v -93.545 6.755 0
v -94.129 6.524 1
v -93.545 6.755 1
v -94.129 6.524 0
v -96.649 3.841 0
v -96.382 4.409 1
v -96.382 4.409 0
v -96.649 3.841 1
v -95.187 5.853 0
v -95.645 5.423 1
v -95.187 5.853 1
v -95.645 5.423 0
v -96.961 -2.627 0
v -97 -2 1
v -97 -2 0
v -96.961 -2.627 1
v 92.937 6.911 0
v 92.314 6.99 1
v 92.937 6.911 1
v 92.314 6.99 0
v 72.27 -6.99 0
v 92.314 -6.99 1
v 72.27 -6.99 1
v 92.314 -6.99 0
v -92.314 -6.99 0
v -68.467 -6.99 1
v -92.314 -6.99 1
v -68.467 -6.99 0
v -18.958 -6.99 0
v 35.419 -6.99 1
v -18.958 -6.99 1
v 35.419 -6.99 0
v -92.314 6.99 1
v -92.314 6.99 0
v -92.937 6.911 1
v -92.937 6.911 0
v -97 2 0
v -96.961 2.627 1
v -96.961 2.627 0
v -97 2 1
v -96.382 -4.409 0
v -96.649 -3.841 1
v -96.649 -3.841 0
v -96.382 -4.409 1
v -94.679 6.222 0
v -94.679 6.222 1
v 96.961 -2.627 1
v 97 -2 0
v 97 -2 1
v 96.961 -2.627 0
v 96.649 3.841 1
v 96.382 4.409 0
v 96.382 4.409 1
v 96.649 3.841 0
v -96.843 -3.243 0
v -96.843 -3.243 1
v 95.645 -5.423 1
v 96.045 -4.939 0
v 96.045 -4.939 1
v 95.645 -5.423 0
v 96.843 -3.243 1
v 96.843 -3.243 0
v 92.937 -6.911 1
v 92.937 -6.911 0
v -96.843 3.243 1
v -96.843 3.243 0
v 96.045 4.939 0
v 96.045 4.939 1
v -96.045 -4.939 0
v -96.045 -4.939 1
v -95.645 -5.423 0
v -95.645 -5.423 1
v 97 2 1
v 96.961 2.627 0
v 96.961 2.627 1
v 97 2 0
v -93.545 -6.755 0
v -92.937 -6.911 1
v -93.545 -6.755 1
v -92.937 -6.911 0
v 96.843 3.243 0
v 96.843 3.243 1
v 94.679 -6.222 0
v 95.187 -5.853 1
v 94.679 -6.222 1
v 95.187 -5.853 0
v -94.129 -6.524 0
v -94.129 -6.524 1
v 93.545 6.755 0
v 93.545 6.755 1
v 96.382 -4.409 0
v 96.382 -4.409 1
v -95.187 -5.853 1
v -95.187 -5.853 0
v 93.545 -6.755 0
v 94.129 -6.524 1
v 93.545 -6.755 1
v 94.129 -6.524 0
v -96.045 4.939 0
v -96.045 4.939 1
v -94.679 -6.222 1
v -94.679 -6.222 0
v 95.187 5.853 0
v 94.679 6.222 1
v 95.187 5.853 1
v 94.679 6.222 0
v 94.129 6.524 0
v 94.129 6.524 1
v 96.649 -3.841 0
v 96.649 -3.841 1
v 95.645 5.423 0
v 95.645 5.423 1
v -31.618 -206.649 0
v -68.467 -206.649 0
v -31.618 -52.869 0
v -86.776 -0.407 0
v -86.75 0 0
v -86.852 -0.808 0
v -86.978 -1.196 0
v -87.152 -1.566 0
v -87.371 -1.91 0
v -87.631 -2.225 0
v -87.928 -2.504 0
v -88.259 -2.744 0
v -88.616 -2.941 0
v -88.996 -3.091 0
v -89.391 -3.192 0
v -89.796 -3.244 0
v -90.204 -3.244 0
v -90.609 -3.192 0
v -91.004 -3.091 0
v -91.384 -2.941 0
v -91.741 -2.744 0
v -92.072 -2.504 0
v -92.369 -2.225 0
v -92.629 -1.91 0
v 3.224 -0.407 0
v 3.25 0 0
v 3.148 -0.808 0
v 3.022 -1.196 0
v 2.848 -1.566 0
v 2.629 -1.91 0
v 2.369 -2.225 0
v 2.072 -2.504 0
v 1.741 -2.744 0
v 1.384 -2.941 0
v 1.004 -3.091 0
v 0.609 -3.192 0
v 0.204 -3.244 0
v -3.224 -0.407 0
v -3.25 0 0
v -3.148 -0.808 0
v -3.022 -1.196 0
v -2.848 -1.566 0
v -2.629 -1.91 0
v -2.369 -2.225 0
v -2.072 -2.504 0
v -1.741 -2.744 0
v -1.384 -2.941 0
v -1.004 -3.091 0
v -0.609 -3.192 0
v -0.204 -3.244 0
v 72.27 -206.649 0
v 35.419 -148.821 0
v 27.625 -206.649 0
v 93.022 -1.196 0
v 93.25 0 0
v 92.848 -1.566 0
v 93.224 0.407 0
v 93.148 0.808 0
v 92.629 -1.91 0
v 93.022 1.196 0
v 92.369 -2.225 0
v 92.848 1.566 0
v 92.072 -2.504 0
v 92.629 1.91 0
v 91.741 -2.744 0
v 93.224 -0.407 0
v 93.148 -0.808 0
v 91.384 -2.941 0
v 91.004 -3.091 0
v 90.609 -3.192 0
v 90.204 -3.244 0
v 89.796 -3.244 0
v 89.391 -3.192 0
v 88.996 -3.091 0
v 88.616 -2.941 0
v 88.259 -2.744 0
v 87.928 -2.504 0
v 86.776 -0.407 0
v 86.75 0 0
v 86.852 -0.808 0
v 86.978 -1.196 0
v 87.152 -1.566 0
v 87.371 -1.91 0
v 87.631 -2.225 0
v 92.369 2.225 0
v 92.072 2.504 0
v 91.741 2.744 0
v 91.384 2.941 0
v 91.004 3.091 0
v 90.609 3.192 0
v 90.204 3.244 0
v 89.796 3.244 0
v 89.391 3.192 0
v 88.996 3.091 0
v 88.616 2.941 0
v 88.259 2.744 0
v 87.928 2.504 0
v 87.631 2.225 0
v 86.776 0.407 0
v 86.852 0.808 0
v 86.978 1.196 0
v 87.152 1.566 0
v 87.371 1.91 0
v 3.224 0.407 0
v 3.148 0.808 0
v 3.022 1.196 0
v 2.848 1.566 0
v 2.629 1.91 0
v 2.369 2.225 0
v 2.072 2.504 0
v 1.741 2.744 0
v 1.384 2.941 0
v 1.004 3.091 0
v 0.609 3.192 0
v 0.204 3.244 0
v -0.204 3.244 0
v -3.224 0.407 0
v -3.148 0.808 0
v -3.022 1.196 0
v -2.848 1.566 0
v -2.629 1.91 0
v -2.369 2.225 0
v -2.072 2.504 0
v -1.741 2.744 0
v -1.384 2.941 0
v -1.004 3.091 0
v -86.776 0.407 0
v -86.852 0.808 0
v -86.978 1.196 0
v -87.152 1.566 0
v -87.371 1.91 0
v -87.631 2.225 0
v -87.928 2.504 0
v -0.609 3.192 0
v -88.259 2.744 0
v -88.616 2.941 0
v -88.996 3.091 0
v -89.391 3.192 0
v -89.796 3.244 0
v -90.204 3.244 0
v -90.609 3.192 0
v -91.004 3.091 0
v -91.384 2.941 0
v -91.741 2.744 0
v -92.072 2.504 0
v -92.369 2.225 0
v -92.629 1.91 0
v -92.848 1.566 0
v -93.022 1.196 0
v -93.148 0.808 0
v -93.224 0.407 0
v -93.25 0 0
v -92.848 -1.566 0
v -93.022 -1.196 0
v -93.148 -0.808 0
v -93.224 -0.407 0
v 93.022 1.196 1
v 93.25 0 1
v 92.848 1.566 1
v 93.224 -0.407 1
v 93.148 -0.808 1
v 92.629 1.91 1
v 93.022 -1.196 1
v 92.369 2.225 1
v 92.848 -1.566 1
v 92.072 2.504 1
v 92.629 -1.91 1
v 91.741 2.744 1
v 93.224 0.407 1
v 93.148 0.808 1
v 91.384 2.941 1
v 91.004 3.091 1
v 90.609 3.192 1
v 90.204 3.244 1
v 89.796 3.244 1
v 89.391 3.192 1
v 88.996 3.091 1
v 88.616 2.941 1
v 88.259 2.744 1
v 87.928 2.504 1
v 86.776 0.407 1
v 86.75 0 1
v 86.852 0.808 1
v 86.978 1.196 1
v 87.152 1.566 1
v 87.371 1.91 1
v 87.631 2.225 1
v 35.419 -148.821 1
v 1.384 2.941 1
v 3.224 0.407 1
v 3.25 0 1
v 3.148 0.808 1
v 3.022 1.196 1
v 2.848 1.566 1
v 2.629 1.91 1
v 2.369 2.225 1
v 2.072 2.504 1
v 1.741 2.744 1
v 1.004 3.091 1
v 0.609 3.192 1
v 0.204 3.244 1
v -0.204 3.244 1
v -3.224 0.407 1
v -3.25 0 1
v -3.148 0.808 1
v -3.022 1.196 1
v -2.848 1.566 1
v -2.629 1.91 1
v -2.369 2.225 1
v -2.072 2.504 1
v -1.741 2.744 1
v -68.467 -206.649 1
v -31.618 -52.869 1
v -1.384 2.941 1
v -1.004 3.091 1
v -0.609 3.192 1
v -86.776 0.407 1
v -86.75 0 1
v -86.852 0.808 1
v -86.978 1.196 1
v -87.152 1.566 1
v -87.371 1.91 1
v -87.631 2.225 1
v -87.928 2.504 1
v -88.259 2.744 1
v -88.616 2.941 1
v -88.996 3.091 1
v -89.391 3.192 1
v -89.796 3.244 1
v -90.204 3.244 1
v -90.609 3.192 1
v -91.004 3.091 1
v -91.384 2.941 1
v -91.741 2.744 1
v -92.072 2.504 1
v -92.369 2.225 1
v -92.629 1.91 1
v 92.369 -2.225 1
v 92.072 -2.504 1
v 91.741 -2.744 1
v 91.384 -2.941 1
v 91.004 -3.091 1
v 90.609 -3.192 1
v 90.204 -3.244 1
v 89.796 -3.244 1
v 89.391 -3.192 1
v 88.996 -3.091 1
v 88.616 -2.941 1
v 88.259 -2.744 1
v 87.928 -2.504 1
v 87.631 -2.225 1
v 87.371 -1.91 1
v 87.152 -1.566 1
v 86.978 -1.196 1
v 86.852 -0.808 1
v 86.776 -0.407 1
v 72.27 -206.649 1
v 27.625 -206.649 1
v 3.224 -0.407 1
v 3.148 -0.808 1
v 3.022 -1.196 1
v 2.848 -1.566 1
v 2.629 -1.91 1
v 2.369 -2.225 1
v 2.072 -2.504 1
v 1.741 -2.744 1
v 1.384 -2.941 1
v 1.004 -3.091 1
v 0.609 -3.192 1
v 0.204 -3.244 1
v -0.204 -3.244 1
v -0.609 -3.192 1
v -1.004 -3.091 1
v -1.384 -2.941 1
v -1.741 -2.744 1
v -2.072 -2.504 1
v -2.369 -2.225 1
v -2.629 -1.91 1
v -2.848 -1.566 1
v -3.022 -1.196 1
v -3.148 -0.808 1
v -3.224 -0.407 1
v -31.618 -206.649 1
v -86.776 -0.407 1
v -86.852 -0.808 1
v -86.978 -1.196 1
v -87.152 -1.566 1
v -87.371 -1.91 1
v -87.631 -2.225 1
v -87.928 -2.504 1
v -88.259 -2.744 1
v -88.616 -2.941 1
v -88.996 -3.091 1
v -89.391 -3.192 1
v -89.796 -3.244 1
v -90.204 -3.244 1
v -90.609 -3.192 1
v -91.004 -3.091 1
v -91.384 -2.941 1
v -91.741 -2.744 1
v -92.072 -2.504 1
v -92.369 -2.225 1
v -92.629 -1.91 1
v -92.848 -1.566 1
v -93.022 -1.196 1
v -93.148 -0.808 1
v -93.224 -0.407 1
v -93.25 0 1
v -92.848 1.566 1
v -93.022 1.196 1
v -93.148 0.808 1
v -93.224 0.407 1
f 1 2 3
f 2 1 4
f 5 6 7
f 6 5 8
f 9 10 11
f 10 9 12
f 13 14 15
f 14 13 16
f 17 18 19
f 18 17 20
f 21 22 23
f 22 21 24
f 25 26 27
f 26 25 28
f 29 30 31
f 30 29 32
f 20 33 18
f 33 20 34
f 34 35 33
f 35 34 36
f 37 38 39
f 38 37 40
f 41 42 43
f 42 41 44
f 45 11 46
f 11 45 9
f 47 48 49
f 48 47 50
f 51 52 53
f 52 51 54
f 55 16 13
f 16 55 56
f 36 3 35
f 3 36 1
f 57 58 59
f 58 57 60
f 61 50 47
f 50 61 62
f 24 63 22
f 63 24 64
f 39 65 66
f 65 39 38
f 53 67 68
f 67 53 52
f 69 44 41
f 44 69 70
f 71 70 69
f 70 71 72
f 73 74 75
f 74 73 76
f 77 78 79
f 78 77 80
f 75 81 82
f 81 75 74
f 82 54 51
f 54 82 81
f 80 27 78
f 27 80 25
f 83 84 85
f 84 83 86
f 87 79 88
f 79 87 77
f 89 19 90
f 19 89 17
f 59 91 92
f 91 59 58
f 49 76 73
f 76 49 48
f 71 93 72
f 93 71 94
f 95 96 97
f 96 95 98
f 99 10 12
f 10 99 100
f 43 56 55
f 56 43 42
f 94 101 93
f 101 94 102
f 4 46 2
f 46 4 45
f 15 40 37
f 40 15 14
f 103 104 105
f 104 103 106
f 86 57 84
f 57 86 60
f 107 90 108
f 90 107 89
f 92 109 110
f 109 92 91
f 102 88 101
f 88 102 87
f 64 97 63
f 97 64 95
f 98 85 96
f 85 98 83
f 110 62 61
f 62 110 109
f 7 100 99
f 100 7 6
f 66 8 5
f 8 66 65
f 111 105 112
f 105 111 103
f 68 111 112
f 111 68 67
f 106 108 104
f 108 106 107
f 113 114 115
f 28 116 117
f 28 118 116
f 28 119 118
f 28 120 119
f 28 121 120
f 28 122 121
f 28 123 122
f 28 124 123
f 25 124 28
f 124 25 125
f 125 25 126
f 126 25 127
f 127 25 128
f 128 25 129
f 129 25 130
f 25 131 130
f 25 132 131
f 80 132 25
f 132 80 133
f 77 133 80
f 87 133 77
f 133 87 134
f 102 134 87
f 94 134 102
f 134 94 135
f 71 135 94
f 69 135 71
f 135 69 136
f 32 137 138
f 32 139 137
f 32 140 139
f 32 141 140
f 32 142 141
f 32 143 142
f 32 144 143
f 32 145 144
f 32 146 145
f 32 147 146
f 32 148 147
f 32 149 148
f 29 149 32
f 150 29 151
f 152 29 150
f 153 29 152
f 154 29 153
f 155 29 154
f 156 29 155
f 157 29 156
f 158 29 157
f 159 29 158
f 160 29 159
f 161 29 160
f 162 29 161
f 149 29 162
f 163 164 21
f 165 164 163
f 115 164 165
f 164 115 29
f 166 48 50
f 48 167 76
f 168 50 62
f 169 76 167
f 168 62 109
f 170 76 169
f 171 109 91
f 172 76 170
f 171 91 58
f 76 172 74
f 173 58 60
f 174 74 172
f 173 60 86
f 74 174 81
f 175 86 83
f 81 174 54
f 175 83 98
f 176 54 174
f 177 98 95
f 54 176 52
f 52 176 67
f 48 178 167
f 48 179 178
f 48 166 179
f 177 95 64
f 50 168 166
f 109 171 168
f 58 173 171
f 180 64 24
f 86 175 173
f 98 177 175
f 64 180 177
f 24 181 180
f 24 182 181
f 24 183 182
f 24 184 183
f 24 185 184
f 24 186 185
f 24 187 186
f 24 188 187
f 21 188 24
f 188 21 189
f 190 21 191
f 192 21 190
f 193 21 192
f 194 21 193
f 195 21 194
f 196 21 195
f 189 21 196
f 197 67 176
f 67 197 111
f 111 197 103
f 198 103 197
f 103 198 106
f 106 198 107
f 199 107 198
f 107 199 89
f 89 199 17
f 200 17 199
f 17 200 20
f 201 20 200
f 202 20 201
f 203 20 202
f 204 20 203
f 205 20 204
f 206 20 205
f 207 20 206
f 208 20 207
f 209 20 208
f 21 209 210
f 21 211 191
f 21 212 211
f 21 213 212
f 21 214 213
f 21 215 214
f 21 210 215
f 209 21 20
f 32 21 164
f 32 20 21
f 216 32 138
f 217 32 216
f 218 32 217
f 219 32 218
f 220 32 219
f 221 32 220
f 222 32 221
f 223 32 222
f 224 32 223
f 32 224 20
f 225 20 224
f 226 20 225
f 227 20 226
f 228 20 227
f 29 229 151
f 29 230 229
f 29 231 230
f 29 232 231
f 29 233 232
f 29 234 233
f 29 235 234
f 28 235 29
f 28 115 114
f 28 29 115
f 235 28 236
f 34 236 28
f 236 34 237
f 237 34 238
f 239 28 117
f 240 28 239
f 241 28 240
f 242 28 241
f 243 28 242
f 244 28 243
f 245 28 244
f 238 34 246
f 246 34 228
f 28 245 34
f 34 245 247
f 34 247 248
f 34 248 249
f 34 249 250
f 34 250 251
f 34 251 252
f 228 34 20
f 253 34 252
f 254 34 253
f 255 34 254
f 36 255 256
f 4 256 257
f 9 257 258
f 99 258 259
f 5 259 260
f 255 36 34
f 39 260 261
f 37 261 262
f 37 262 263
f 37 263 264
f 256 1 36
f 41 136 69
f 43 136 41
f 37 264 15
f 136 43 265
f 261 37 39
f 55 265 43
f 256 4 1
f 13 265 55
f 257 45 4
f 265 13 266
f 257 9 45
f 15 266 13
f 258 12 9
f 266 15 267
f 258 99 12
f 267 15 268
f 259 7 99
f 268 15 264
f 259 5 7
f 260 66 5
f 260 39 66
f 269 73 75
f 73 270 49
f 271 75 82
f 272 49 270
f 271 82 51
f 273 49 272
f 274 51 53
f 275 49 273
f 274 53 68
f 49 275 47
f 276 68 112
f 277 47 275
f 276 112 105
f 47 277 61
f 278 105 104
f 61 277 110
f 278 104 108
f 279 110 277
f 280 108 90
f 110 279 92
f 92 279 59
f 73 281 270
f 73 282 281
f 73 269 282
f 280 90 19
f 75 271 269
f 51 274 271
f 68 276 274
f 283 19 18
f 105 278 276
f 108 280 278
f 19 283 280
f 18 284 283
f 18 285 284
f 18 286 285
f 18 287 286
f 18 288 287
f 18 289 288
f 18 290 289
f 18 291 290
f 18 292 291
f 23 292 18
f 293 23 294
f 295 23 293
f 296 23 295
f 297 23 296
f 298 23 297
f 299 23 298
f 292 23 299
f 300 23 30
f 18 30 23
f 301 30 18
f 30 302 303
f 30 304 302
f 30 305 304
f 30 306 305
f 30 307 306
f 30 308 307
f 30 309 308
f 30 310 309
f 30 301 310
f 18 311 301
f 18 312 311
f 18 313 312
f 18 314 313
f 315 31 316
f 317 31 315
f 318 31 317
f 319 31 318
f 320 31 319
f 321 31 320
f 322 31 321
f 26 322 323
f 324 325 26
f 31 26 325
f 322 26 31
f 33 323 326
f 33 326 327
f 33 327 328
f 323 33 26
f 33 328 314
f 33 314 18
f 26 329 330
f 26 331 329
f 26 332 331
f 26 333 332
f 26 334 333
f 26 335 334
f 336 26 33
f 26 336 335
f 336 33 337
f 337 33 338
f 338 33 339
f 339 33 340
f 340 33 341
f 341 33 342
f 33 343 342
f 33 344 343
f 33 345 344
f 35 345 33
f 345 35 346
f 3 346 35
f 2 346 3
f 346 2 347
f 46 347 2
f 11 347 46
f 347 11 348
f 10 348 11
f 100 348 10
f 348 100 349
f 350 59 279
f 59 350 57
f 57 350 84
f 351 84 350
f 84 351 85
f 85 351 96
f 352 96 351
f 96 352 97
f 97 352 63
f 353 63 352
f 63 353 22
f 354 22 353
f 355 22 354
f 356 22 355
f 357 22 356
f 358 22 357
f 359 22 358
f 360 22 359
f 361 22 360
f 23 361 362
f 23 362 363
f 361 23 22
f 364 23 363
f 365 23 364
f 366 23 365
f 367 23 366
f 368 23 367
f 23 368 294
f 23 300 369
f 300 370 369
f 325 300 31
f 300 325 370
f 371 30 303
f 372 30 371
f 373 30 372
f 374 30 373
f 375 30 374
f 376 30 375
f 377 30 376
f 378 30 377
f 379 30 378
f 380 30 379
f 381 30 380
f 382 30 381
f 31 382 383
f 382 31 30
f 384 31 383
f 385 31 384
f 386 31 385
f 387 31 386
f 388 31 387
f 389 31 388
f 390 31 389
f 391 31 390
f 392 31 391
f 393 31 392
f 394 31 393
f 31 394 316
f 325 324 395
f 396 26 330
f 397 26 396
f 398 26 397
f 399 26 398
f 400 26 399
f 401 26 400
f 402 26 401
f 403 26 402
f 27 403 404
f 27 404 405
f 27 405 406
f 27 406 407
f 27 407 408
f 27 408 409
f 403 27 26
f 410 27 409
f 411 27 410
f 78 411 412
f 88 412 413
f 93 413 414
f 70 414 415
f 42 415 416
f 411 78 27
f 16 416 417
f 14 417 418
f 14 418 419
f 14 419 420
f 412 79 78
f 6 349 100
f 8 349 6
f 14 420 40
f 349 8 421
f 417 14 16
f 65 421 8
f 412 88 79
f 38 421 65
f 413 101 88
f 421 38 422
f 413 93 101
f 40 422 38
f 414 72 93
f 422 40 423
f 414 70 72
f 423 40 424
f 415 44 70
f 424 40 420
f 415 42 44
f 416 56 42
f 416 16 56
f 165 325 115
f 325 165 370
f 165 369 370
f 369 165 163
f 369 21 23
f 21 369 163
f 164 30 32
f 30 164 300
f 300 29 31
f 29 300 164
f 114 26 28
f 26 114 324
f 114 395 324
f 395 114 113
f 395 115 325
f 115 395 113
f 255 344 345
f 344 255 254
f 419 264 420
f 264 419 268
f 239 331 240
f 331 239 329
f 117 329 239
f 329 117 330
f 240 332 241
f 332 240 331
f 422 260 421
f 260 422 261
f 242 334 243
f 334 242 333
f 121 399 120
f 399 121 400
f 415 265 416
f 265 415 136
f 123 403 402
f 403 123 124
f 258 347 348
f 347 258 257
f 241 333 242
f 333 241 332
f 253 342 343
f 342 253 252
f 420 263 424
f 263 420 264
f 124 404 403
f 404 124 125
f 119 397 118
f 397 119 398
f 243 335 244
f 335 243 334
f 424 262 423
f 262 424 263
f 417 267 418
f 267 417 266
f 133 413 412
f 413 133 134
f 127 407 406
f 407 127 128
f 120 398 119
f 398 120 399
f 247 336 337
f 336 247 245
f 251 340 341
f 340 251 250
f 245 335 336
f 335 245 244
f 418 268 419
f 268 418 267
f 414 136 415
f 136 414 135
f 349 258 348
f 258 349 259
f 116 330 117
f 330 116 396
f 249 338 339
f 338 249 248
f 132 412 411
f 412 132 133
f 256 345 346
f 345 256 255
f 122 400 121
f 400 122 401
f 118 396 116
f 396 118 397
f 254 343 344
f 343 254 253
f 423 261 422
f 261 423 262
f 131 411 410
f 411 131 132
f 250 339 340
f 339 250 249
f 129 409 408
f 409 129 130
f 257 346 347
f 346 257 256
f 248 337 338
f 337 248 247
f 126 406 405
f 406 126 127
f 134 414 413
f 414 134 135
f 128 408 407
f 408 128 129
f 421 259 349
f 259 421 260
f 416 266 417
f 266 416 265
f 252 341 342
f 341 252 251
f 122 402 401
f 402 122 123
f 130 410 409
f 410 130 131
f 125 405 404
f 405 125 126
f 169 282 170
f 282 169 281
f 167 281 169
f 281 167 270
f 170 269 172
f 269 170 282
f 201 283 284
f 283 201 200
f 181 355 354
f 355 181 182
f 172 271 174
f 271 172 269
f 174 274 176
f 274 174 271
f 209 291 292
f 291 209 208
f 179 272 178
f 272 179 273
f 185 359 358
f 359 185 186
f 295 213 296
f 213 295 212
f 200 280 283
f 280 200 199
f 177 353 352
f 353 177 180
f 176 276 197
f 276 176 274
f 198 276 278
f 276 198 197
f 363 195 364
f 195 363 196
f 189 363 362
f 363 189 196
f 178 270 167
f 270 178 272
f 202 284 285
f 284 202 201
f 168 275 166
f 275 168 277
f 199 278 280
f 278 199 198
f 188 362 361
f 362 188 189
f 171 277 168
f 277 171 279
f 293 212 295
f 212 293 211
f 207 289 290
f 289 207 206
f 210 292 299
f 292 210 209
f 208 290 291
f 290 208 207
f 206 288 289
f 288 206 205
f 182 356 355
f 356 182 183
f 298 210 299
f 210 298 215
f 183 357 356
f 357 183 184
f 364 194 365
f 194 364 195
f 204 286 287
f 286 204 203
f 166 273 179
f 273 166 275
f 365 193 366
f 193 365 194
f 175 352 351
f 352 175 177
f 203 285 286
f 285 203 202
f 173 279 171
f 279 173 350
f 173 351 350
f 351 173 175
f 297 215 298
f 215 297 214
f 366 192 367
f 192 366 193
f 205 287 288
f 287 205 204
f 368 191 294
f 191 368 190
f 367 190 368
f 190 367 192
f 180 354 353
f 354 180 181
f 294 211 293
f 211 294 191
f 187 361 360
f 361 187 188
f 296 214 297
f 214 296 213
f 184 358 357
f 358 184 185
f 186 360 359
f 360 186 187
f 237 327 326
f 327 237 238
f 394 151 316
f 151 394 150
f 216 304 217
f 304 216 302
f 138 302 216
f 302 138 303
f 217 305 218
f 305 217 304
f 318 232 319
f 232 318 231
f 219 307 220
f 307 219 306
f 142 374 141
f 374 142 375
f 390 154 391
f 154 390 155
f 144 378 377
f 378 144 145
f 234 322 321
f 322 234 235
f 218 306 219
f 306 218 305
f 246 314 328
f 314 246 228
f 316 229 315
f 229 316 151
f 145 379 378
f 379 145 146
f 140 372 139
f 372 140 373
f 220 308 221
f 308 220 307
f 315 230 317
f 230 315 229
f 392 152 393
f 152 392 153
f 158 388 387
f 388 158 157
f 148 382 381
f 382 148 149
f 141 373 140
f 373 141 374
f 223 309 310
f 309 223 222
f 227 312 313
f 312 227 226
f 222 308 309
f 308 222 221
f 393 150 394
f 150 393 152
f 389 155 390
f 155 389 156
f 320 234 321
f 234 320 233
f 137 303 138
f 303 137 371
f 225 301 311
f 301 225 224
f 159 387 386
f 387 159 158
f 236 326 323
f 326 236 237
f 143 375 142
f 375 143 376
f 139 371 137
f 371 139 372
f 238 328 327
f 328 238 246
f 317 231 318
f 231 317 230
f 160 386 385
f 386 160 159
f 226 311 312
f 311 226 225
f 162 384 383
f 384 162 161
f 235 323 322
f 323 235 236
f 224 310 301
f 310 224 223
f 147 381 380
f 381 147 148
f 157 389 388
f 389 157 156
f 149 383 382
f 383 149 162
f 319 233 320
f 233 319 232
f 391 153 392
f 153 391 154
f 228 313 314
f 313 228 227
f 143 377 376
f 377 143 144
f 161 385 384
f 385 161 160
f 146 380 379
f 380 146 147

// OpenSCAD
$fn = 50;


difference() {
	union() {
		translate(v = [0, 0, 0]) {
			rotate(a = [0, 0, 0]) {
				hull() {
					translate(v = [-92.0000000000, 2.0000000000, 0]) {
						rotate(a = [0, 0, 0]) {
							translate(v = [0, 0, 0]) {
								rotate(a = [0, 0, 0]) {
									cylinder(h = 1, r = 5);
								}
							}
						}
					}
					translate(v = [92.0000000000, 2.0000000000, 0]) {
						rotate(a = [0, 0, 0]) {
							translate(v = [0, 0, 0]) {
								rotate(a = [0, 0, 0]) {
									cylinder(h = 1, r = 5);
								}
							}
						}
					}
					translate(v = [-92.0000000000, -2.0000000000, 0]) {
						rotate(a = [0, 0, 0]) {
							translate(v = [0, 0, 0]) {
								rotate(a = [0, 0, 0]) {
									cylinder(h = 1, r = 5);
								}
							}
						}
					}
					translate(v = [92.0000000000, -2.0000000000, 0]) {
						rotate(a = [0, 0, 0]) {
							translate(v = [0, 0, 0]) {
								rotate(a = [0, 0, 0]) {
									cylinder(h = 1, r = 5);
								}
							}
						}
					}
				}
			}
		}
		translate(v = [0, 0, 0]) {
			rotate(a = [0, 0, 0]) {
				linear_extrude(height = 1) {
					text(font = "DejaVu Sans Mono:style=Bold", halign = "center", size = 209.0000000000, text = "N", valign = "top");
				}
			}
		}
	}
	union() {
		translate(v = [-90.0000000000, 0.0000000000, -125.0000000000]) {
			rotate(a = [0, 0, 0]) {
				cylinder(h = 250, r = 3.2500000000);
			}
		}
		translate(v = [90.0000000000, 0.0000000000, -125.0000000000]) {
			rotate(a = [0, 0, 0]) {
				cylinder(h = 250, r = 3.2500000000);
			}
		}
		translate(v = [90.0000000000, 0.0000000000, -125.0000000000]) {
			rotate(a = [0, 0, 0]) {
				cylinder(h = 250, r = 3.2500000000);
			}
		}
		translate(v = [0, 0, -125.0000000000]) {
			rotate(a = [0, 0, 0]) {
				cylinder(h = 250, r = 3.2500000000);
			}
		}
	}
}
